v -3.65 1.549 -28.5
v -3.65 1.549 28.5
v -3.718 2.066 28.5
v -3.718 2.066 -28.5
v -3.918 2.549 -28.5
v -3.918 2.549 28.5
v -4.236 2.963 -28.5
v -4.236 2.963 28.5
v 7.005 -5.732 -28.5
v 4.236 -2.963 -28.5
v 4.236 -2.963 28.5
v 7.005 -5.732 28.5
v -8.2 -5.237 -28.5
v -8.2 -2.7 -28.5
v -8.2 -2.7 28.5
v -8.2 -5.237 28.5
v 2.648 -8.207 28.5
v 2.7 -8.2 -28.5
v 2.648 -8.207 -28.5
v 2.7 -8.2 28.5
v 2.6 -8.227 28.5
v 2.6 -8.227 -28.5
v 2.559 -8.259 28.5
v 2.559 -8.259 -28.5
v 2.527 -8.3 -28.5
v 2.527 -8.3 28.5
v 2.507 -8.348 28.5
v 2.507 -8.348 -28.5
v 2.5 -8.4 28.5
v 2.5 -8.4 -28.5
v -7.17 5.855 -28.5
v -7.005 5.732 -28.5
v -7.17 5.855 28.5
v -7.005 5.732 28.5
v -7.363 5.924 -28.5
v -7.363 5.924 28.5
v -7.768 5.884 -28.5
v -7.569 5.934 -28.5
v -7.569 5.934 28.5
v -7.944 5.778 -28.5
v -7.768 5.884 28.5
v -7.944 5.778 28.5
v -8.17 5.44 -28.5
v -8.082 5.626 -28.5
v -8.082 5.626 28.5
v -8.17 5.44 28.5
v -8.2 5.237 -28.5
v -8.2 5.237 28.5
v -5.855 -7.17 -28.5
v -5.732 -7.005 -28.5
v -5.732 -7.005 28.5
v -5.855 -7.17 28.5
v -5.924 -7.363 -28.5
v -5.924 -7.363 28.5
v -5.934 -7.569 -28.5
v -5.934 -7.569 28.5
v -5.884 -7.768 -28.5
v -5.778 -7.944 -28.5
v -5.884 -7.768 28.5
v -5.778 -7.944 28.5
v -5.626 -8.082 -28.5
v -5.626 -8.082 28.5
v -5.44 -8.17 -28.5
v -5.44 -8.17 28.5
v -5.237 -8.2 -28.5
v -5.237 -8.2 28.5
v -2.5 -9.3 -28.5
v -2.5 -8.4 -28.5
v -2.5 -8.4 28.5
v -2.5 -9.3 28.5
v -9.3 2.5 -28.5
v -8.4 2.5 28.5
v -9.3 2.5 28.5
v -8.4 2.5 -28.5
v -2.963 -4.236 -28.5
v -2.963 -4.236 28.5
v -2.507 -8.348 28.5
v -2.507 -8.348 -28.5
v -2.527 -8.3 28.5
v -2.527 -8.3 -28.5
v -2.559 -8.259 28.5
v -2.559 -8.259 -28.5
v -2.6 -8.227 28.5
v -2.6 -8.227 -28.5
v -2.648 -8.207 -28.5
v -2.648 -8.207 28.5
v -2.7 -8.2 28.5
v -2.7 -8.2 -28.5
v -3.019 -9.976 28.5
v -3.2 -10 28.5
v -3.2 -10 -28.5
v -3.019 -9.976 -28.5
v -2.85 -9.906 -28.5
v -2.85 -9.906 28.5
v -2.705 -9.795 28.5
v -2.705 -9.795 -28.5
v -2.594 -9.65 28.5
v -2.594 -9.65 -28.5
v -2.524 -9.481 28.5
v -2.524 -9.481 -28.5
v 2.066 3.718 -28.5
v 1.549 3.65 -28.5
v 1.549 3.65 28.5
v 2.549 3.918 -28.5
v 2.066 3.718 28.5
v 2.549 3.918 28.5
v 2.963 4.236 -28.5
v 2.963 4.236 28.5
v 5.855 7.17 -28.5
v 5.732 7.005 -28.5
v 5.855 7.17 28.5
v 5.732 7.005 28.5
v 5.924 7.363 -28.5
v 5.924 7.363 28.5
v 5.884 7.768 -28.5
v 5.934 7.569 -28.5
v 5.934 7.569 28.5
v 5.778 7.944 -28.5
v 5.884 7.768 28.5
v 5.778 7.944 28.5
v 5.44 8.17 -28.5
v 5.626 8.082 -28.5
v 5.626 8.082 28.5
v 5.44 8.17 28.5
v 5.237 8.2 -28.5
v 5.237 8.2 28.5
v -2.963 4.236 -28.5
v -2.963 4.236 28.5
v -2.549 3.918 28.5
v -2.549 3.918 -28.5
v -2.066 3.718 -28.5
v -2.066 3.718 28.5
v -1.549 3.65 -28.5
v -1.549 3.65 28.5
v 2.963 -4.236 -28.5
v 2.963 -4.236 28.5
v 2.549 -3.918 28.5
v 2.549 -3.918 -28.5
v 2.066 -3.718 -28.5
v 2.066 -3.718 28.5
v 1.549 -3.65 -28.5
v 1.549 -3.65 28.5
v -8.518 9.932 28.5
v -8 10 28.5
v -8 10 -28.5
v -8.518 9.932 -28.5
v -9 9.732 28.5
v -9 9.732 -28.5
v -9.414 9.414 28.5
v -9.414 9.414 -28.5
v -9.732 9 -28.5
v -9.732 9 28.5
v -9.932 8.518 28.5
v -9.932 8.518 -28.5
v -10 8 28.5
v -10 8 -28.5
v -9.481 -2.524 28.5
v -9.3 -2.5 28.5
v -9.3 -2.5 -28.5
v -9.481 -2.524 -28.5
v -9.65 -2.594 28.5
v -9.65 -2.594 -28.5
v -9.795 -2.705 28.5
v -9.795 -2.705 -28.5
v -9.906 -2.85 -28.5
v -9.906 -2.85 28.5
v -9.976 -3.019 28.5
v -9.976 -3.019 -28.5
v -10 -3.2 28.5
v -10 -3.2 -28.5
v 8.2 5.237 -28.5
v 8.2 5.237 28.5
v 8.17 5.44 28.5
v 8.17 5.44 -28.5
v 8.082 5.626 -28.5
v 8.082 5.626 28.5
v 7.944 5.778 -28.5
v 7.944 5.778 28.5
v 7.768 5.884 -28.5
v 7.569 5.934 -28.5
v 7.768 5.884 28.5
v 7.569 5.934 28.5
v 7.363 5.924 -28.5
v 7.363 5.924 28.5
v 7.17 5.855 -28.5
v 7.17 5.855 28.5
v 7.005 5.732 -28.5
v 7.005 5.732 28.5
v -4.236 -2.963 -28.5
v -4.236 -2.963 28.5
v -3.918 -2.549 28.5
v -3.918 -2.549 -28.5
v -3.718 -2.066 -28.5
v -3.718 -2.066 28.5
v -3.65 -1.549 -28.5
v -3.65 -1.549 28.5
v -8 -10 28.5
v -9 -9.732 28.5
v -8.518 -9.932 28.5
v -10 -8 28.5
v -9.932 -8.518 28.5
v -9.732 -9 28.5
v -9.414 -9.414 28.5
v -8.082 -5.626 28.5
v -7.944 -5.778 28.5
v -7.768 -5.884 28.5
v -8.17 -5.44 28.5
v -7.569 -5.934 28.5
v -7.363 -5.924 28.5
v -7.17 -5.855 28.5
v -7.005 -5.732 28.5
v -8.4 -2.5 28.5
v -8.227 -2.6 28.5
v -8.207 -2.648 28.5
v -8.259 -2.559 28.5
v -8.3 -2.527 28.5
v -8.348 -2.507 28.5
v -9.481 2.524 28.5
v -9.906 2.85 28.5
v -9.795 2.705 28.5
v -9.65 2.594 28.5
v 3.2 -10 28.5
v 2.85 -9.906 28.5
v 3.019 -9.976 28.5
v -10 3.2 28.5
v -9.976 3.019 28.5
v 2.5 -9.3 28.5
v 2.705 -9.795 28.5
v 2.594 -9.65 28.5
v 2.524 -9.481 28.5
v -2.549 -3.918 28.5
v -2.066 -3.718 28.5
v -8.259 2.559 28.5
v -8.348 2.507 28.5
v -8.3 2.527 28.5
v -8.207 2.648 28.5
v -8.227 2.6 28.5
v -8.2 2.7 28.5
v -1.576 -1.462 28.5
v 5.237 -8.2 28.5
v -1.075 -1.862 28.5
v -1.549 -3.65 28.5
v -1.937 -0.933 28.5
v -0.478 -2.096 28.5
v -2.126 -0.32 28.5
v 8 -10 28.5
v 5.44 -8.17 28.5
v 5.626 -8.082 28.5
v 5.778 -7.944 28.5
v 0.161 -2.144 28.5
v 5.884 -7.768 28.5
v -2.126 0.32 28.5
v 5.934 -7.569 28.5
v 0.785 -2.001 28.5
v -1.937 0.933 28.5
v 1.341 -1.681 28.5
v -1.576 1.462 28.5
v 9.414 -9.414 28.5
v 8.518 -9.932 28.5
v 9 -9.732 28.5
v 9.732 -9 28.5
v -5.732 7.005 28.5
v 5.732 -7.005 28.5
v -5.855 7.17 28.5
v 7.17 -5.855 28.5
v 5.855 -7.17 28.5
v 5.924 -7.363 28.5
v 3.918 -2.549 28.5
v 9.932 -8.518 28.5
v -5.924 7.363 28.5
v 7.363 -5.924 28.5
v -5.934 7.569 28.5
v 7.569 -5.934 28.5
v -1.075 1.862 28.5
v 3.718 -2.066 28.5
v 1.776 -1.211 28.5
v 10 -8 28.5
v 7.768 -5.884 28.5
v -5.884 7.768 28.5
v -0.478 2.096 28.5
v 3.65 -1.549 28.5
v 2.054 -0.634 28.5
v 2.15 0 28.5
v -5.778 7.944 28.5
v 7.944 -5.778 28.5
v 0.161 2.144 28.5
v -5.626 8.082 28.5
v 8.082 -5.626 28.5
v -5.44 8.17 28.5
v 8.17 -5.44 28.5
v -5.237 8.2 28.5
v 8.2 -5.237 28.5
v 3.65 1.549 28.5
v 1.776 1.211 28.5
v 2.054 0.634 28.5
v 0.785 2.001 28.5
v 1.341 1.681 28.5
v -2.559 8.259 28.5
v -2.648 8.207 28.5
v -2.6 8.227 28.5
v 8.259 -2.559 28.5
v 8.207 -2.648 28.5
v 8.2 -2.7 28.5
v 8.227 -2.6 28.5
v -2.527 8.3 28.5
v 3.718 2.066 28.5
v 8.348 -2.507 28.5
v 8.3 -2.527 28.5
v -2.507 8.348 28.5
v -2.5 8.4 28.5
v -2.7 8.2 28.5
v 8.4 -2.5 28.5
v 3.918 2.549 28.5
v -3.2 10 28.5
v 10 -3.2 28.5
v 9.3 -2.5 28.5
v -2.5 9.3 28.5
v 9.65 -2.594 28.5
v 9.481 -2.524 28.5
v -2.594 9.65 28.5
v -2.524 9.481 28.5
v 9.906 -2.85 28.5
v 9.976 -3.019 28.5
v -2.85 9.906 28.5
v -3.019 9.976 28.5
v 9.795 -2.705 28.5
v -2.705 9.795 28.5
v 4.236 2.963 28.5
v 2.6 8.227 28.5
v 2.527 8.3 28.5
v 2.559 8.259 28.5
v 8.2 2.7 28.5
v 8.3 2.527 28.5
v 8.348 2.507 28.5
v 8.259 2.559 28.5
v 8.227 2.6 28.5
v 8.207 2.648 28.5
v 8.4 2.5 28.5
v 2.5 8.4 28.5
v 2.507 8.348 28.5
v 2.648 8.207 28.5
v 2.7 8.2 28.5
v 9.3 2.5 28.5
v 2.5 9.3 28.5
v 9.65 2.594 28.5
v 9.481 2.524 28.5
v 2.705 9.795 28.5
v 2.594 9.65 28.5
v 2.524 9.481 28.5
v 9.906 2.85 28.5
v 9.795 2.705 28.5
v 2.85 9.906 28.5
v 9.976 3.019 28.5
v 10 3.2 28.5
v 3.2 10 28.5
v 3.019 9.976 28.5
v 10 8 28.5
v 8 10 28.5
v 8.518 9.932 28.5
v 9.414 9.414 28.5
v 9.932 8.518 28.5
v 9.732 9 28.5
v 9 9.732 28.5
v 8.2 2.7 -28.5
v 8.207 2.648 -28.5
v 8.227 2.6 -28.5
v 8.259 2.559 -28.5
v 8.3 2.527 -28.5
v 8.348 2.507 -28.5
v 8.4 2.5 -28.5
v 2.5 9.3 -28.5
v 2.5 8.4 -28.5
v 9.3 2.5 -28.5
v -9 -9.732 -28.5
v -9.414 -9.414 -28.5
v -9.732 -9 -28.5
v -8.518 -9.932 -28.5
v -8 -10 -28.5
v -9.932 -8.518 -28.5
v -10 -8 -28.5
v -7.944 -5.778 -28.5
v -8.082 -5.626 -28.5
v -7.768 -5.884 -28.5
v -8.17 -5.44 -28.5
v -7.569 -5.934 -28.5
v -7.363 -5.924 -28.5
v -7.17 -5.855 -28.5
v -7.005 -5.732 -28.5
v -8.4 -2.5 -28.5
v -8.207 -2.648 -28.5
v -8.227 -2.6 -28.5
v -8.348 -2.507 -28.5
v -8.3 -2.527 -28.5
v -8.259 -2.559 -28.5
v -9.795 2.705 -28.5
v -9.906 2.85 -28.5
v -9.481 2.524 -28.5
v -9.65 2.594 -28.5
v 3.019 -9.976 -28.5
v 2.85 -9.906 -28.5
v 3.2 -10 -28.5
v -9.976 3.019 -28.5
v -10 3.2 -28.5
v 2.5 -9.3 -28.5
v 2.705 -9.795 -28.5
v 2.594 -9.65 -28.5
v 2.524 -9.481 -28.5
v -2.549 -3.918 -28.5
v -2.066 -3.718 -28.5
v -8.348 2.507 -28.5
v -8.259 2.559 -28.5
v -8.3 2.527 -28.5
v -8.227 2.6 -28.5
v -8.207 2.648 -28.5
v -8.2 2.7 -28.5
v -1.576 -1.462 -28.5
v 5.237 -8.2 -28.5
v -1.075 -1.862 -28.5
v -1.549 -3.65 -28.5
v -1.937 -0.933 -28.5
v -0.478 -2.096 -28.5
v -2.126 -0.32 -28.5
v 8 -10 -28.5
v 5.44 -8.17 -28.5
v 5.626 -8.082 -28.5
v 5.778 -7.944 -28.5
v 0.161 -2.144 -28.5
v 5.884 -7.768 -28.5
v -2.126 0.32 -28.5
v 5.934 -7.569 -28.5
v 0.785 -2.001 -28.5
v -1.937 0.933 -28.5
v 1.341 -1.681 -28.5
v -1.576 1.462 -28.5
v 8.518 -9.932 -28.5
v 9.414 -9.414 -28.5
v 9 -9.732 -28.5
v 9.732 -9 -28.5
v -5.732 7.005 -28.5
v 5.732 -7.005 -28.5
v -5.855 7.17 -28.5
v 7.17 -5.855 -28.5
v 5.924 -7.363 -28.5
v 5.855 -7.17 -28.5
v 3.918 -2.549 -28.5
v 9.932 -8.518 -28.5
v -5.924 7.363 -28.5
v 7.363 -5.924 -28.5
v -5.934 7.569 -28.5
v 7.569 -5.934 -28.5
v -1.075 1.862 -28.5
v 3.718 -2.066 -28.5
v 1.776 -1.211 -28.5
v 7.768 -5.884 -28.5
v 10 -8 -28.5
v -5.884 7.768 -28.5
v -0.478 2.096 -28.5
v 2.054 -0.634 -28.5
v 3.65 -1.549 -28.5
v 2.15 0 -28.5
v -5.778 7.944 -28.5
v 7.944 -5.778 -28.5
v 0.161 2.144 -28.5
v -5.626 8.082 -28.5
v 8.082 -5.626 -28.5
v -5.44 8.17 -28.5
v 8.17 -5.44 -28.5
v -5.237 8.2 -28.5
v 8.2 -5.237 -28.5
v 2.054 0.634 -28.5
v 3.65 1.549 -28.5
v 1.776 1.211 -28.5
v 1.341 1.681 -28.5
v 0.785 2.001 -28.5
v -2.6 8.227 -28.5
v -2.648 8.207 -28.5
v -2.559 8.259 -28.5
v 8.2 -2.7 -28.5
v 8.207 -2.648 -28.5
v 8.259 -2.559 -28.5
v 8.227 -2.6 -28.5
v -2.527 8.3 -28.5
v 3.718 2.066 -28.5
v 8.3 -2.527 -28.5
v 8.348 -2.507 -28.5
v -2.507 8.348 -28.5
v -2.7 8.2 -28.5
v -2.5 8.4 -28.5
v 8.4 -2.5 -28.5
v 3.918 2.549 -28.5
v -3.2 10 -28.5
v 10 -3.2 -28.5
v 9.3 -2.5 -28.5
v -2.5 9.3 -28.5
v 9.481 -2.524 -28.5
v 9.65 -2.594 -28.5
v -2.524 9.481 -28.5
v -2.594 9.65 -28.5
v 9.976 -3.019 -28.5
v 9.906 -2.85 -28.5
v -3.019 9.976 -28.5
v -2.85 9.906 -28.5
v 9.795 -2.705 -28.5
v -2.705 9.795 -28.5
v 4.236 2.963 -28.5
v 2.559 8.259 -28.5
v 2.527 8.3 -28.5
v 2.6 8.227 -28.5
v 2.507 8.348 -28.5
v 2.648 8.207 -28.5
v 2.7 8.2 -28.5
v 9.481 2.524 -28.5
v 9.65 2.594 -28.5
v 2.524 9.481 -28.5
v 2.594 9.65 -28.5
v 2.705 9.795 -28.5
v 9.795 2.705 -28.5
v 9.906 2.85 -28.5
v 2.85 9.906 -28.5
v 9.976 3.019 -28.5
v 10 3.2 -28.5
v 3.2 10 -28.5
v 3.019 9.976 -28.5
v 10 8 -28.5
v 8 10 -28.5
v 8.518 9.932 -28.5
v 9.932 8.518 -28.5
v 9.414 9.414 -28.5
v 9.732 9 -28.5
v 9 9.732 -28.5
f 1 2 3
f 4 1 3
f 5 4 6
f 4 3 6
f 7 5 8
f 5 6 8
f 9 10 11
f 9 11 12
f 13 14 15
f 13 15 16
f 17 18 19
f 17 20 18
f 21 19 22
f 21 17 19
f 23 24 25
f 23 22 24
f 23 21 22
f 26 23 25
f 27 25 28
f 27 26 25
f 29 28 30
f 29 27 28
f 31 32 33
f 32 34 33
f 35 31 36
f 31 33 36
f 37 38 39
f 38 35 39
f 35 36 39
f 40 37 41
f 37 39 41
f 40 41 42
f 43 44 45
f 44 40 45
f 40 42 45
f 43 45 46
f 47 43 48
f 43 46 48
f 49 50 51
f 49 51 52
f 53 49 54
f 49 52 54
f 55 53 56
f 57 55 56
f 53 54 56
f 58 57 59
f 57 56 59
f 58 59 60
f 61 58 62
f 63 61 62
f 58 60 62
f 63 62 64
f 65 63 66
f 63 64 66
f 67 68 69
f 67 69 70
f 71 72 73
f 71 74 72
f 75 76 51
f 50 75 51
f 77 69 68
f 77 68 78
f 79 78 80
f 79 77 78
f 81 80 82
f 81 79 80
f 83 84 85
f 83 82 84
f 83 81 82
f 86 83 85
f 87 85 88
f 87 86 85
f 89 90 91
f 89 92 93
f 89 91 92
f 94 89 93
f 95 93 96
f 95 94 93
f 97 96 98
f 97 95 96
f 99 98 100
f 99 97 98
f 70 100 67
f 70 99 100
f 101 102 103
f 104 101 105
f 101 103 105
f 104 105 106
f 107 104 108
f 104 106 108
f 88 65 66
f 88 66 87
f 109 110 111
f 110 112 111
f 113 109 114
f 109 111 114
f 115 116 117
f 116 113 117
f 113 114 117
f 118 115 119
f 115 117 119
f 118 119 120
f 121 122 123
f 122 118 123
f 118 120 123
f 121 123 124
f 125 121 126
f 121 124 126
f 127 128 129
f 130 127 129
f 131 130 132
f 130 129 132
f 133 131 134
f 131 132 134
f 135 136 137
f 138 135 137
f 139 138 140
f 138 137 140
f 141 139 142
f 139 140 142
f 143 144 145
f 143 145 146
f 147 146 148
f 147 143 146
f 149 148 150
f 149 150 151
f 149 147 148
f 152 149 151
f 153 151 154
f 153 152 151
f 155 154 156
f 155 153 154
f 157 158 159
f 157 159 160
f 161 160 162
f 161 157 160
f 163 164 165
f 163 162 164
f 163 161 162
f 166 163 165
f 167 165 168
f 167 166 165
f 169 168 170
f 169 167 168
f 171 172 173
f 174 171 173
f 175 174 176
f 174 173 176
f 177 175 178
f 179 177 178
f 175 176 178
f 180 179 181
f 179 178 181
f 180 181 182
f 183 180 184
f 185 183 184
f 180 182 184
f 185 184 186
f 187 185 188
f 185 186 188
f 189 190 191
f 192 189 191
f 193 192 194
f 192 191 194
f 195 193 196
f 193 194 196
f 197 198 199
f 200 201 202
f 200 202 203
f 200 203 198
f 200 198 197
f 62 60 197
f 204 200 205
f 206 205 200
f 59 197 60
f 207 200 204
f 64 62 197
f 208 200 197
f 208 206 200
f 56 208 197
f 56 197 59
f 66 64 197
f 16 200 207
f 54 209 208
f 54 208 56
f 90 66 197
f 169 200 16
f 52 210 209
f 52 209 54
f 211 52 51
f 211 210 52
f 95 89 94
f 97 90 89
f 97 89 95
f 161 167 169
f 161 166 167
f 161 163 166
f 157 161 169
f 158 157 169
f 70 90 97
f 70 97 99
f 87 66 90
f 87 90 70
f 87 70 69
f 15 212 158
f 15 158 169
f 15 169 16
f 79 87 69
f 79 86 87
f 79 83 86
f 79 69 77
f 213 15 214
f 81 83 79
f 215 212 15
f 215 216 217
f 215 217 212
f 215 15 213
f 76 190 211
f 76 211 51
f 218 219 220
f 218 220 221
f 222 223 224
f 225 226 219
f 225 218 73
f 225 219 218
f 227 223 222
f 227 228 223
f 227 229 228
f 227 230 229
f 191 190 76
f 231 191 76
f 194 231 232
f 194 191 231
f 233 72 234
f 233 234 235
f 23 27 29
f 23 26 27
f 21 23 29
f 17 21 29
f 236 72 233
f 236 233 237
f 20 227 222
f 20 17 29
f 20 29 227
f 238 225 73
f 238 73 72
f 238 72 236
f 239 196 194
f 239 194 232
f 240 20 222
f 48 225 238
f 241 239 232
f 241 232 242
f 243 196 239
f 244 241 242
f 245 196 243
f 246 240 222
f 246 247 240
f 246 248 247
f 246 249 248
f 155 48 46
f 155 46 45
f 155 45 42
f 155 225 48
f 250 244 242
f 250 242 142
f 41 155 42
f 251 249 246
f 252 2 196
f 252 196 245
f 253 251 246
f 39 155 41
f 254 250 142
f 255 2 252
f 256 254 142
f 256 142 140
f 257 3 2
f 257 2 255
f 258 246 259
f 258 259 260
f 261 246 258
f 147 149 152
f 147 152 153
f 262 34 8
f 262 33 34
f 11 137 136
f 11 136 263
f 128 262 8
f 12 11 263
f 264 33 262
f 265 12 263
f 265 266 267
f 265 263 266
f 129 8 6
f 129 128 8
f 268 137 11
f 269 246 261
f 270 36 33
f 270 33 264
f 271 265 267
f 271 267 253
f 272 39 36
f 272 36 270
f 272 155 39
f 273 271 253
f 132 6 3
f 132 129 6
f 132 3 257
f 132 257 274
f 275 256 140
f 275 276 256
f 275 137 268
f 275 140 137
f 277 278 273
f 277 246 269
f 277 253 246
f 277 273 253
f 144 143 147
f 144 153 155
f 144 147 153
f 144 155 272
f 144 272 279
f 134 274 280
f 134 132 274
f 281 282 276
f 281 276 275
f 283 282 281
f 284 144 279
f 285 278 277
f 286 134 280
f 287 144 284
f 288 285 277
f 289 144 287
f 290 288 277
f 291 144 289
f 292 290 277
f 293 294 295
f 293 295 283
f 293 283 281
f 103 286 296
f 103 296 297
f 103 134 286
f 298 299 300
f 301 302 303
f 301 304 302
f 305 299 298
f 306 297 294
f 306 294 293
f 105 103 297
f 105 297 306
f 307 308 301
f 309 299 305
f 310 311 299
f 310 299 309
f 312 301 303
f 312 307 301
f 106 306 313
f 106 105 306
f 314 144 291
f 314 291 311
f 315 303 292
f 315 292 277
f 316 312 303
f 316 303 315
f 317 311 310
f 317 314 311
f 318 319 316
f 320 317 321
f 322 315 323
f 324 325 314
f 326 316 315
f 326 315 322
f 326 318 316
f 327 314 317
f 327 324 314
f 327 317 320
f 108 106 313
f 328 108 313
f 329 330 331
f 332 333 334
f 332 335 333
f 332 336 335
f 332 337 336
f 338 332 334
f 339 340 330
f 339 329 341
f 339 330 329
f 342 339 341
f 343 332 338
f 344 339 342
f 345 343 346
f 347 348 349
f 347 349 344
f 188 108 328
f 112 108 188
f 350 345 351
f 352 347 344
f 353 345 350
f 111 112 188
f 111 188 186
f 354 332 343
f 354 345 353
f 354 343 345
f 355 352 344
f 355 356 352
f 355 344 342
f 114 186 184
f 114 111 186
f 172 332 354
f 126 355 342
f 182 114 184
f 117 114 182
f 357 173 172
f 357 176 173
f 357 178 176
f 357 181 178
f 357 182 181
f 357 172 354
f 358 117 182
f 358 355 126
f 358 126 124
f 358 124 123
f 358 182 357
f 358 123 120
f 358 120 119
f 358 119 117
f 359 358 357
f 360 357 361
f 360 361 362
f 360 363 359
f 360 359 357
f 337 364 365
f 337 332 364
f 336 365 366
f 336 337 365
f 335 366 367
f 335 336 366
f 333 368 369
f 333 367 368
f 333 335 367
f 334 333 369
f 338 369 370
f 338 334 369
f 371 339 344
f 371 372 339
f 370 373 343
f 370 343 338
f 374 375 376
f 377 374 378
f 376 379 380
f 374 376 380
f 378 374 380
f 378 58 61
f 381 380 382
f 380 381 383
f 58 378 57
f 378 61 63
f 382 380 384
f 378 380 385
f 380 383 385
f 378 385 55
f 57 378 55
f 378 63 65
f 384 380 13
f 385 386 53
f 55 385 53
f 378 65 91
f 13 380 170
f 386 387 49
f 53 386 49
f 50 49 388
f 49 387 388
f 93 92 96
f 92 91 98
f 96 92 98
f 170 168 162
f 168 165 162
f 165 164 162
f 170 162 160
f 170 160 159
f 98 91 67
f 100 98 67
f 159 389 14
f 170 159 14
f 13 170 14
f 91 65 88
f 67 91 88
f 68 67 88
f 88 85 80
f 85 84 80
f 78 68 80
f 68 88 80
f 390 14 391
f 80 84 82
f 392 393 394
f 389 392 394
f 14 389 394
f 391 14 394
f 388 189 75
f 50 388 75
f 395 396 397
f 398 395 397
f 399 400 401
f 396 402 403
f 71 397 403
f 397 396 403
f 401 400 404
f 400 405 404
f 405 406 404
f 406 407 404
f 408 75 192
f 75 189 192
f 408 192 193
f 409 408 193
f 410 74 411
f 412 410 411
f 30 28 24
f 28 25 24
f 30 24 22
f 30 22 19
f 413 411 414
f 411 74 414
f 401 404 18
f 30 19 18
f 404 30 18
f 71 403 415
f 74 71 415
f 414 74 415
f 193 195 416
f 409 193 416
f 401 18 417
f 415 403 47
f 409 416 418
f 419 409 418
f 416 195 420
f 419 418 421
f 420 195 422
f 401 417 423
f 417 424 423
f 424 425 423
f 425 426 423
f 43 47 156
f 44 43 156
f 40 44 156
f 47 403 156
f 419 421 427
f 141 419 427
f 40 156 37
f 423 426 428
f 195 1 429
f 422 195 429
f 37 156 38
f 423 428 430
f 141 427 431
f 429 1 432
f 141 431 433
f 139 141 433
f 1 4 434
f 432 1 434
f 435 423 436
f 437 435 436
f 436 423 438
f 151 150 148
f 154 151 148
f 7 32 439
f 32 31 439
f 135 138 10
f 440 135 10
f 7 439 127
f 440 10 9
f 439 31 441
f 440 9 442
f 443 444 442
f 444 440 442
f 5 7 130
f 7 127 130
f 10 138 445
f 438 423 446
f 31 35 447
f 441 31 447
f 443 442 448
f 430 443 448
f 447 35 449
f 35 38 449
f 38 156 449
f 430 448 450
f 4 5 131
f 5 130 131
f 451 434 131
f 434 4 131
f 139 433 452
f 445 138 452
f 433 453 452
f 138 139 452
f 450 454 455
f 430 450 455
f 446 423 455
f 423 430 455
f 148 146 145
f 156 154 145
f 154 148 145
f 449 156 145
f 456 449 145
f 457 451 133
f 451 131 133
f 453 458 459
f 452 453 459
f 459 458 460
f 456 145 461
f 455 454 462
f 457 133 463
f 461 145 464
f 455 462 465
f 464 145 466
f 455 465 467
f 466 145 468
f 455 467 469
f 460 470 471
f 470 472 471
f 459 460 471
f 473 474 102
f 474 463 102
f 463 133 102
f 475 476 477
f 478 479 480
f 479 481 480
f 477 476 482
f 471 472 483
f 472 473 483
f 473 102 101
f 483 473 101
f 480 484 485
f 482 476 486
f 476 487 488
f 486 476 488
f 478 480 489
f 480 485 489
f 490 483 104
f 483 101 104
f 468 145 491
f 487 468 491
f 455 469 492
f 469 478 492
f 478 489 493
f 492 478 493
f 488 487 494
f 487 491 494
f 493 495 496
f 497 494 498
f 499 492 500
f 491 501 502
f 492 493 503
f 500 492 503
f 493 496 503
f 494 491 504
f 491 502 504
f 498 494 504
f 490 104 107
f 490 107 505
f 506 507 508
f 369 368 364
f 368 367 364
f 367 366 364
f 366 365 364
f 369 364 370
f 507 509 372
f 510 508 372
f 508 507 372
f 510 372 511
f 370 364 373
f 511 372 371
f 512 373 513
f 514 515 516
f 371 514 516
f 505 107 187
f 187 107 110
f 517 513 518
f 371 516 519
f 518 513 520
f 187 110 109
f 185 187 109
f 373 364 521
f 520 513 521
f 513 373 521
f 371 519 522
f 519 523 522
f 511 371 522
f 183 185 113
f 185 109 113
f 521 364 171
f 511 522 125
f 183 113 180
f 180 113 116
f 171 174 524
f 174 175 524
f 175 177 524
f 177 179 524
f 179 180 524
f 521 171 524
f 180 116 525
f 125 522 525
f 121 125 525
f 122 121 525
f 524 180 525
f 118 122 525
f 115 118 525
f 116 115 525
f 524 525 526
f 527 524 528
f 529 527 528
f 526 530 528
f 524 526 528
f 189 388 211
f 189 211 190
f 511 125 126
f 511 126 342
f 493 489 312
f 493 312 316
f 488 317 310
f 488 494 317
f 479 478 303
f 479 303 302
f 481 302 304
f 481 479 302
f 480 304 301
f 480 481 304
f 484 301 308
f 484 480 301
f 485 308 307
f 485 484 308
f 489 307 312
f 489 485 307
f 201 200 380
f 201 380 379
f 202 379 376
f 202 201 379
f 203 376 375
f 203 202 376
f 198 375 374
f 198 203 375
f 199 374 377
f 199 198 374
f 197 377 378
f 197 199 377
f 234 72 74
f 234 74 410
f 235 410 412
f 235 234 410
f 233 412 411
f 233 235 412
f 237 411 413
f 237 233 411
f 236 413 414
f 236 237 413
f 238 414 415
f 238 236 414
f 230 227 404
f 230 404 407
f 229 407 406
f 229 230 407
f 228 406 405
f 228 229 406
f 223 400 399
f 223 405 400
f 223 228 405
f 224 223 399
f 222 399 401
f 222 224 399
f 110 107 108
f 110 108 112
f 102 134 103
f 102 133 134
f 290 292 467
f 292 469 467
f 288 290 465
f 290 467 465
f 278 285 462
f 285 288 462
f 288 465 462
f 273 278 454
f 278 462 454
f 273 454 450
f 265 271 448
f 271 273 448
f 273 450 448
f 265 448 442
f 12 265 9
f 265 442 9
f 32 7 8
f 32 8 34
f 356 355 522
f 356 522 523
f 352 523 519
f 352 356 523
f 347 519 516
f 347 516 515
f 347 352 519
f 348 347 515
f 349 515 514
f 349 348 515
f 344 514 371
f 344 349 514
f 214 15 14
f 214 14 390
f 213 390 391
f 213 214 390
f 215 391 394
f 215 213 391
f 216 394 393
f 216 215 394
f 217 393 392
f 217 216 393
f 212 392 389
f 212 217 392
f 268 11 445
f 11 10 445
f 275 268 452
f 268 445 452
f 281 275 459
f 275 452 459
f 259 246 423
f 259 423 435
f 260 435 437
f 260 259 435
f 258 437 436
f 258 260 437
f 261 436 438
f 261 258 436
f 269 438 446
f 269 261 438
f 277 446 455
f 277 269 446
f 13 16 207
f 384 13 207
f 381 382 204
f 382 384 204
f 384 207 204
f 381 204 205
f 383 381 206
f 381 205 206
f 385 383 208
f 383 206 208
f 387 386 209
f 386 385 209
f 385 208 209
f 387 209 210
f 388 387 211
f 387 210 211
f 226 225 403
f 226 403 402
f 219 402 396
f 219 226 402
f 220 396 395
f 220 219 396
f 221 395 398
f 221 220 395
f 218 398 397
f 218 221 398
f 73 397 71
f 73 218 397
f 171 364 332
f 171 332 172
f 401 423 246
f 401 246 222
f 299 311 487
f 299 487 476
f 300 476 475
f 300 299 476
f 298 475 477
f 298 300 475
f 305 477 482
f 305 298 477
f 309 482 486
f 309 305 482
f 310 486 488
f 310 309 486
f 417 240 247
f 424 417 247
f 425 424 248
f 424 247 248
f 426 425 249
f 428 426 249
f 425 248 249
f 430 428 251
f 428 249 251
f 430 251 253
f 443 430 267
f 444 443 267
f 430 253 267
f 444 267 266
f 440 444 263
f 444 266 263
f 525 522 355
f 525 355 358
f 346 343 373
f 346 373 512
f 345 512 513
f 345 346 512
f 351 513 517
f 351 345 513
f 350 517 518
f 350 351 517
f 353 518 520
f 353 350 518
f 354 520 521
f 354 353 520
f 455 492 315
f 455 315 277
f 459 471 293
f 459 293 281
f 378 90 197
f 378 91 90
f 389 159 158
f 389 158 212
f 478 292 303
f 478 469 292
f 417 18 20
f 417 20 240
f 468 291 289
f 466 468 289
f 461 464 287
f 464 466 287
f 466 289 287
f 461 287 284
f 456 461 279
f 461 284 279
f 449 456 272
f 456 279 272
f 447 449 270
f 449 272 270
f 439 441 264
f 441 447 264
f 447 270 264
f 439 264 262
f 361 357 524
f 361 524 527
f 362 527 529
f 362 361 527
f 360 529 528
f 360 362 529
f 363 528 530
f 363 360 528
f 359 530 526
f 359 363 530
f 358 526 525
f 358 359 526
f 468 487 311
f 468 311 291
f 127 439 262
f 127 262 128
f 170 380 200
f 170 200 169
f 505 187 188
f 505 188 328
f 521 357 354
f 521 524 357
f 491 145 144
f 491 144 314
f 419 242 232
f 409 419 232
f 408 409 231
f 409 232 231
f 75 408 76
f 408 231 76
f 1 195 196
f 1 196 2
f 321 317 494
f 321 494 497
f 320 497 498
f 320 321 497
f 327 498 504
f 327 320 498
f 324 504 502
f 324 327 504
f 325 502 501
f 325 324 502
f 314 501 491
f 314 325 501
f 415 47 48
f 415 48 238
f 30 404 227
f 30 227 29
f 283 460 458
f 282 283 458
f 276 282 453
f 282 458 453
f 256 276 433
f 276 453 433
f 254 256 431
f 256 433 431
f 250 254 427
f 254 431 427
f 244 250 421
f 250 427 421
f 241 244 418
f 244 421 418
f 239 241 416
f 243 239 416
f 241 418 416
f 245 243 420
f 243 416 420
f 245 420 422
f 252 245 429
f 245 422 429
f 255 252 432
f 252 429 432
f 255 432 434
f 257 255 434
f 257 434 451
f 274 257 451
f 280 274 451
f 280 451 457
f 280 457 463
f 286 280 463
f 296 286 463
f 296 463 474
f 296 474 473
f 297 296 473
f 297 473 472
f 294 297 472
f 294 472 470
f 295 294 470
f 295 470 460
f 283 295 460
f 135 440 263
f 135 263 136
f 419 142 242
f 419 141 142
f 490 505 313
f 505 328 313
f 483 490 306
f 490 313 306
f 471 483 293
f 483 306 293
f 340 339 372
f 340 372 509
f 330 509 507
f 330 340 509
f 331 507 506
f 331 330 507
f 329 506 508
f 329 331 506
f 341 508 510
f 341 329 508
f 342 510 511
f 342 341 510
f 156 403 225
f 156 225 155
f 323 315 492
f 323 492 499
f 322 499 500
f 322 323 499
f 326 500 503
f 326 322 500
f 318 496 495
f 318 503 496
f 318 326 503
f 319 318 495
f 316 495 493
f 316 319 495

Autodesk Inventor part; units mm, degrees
ref_plane "YZ Plane" through (0, 0, 0) normal (1, 0, 0) x (0, 1, 0)
ref_plane "XZ Plane" through (0, 0, 0) normal (0, 1, 0) x (-1, 0, 0)
ref_plane "XY Plane" through (0, 0, 0) normal (0, 0, 1) x (1, 0, 0)
sketch "Sketch1" plane through (0, 0, 0) normal (0, 0, 1) x (1, 0, 0)
  circle A0 centre (0, 0) radius 2.15
  line L0 (-10, 10) -> (-2.5, 10)
  line L1 (-2.5, 10) -> (-2.5, 8.2)
  line L2 (-2.5, 8.2) -> (-6.9272, 8.2)
  line L3 (-6.9272, 8.2) -> (-2.3772, 3.65)
  line L4 (-2.3772, 3.65) -> (2.3772, 3.65)
  line L5 (2.3772, 3.65) -> (6.9272, 8.2)
  line L6 (6.9272, 8.2) -> (2.5, 8.2)
  line L7 (2.5, 8.2) -> (2.5, 10)
  line L8 (2.5, 10) -> (10, 10)
  line L9 (10, 10) -> (10, 2.5)
  line L10 (10, 2.5) -> (8.2, 2.5)
  line L11 (8.2, 2.5) -> (8.2, 6.9272)
  line L12 (8.2, 6.9272) -> (3.65, 2.3772)
  line L13 (3.65, 2.3772) -> (3.65, -2.3772)
  line L14 (3.65, -2.3772) -> (8.2, -6.9272)
  line L15 (8.2, -6.9272) -> (8.2, -2.5)
  line L16 (8.2, -2.5) -> (10, -2.5)
  line L17 (10, -2.5) -> (10, -10)
  line L18 (10, -10) -> (2.5, -10)
  line L19 (2.5, -10) -> (2.5, -8.2)
  line L20 (2.5, -8.2) -> (6.9272, -8.2)
  line L21 (6.9272, -8.2) -> (2.3772, -3.65)
  line L22 (2.3772, -3.65) -> (-2.3772, -3.65)
  line L23 (-2.3772, -3.65) -> (-6.9272, -8.2)
  line L24 (-6.9272, -8.2) -> (-2.5, -8.2)
  line L25 (-2.5, -8.2) -> (-2.5, -10)
  line L26 (-2.5, -10) -> (-10, -10)
  line L27 (-10, -10) -> (-10, -2.5)
  line L28 (-10, -2.5) -> (-8.2, -2.5)
  line L29 (-8.2, -2.5) -> (-8.2, -6.9272)
  line L30 (-8.2, -6.9272) -> (-3.65, -2.3772)
  line L31 (-3.65, -2.3772) -> (-3.65, 2.3772)
  line L32 (-3.65, 2.3772) -> (-8.2, 6.9272)
  line L33 (-8.2, 6.9272) -> (-8.2, 2.5)
  line L34 (-8.2, 2.5) -> (-10, 2.5)
  line L35 (-10, 2.5) -> (-10, 10)
  line L36 (0, 0) -> (-30.8654, 30.8654)
  line L37 (0, 0) -> (30.8654, 30.8654)
  line L38 (0, 0) -> (42.5392, 0)
  line L39 (0, 0) -> (0, 44.3419)
  dimension "d0" = 45
  dimension "d1" = 90
  dimension "Breite" = 20
  dimension "Tiefe_Schiene" = 6.35
  dimension "d2" = 1.8
  dimension "Durchmesser_Loch" = 4.3
  dimension "Wandstaerke" = 1.8
  dimension "d3" = 1.8
  dimension "Breite_Schiene" = 5
  dimension "d4" = 5
extrude "Extrusion1" add sketch "Sketch1" along normal mid plane 57 contours L38 L13 L14 L15 L16 L17 L18 L19 L20 L21 L22 L23 L24 L25 L26 L27 L28 L29 L30 L31 L32 L33 L34 L35 L36 A0 | A0 L37 L9 L10 L11 L12 L13 L38 | A0 L39 L4 L5 L6 L7 L8 L37 | L36 L0 L1 L2 L3 L4 L39 A0
fillet "Fillet1" radius 2 4 edges at (10, 10, 0) (-10, 10, 0) (10, -10, 0) (-10, -10, 0)
fillet "Fillet2" radius 0.2 8 edges at (-2.5, 8.2, 0) (2.5, 8.2, 0) (8.2, 2.5, 0) (8.2, -2.5, 0) (-2.5, -8.2, 0) (-8.2, -2.5, 0) (-8.2, 2.5, 0) (2.5, -8.2, 0)
fillet "Fillet3" radius 0.7 16 edges at (-2.5, 10, 0) (2.5, 10, 0) (10, 2.5, 0) (10, -2.5, 0) (2.5, -10, 0) (-2.5, -10, 0) (-10, -2.5, 0) (-10, 2.5, 0) (-6.9272, -8.2, 0) (-8.2, -6.9272, 0) (6.9272, -8.2, 0) (8.2, -6.9272, 0) (8.2, 6.9272, 0) (6.9272, 8.2, 0) (-6.9272, 8.2, 0) (-8.2, 6.9272, 0)
fillet "Fillet4" radius 2 8 edges at (-3.65, 2.3772, 0) (-2.3772, 3.65, 0) (2.3772, 3.65, 0) (3.65, 2.3772, 0) (3.65, -2.3772, 0) (2.3772, -3.65, 0) (-2.3772, -3.65, 0) (-3.65, -2.3772, 0)
equation "\"d2\" = Wandstaerke"
equation "\"d3\" = Wandstaerke"
equation "\"d4\" = Breite_Schiene"
properties part number "ITEM_20x20_77mm"
